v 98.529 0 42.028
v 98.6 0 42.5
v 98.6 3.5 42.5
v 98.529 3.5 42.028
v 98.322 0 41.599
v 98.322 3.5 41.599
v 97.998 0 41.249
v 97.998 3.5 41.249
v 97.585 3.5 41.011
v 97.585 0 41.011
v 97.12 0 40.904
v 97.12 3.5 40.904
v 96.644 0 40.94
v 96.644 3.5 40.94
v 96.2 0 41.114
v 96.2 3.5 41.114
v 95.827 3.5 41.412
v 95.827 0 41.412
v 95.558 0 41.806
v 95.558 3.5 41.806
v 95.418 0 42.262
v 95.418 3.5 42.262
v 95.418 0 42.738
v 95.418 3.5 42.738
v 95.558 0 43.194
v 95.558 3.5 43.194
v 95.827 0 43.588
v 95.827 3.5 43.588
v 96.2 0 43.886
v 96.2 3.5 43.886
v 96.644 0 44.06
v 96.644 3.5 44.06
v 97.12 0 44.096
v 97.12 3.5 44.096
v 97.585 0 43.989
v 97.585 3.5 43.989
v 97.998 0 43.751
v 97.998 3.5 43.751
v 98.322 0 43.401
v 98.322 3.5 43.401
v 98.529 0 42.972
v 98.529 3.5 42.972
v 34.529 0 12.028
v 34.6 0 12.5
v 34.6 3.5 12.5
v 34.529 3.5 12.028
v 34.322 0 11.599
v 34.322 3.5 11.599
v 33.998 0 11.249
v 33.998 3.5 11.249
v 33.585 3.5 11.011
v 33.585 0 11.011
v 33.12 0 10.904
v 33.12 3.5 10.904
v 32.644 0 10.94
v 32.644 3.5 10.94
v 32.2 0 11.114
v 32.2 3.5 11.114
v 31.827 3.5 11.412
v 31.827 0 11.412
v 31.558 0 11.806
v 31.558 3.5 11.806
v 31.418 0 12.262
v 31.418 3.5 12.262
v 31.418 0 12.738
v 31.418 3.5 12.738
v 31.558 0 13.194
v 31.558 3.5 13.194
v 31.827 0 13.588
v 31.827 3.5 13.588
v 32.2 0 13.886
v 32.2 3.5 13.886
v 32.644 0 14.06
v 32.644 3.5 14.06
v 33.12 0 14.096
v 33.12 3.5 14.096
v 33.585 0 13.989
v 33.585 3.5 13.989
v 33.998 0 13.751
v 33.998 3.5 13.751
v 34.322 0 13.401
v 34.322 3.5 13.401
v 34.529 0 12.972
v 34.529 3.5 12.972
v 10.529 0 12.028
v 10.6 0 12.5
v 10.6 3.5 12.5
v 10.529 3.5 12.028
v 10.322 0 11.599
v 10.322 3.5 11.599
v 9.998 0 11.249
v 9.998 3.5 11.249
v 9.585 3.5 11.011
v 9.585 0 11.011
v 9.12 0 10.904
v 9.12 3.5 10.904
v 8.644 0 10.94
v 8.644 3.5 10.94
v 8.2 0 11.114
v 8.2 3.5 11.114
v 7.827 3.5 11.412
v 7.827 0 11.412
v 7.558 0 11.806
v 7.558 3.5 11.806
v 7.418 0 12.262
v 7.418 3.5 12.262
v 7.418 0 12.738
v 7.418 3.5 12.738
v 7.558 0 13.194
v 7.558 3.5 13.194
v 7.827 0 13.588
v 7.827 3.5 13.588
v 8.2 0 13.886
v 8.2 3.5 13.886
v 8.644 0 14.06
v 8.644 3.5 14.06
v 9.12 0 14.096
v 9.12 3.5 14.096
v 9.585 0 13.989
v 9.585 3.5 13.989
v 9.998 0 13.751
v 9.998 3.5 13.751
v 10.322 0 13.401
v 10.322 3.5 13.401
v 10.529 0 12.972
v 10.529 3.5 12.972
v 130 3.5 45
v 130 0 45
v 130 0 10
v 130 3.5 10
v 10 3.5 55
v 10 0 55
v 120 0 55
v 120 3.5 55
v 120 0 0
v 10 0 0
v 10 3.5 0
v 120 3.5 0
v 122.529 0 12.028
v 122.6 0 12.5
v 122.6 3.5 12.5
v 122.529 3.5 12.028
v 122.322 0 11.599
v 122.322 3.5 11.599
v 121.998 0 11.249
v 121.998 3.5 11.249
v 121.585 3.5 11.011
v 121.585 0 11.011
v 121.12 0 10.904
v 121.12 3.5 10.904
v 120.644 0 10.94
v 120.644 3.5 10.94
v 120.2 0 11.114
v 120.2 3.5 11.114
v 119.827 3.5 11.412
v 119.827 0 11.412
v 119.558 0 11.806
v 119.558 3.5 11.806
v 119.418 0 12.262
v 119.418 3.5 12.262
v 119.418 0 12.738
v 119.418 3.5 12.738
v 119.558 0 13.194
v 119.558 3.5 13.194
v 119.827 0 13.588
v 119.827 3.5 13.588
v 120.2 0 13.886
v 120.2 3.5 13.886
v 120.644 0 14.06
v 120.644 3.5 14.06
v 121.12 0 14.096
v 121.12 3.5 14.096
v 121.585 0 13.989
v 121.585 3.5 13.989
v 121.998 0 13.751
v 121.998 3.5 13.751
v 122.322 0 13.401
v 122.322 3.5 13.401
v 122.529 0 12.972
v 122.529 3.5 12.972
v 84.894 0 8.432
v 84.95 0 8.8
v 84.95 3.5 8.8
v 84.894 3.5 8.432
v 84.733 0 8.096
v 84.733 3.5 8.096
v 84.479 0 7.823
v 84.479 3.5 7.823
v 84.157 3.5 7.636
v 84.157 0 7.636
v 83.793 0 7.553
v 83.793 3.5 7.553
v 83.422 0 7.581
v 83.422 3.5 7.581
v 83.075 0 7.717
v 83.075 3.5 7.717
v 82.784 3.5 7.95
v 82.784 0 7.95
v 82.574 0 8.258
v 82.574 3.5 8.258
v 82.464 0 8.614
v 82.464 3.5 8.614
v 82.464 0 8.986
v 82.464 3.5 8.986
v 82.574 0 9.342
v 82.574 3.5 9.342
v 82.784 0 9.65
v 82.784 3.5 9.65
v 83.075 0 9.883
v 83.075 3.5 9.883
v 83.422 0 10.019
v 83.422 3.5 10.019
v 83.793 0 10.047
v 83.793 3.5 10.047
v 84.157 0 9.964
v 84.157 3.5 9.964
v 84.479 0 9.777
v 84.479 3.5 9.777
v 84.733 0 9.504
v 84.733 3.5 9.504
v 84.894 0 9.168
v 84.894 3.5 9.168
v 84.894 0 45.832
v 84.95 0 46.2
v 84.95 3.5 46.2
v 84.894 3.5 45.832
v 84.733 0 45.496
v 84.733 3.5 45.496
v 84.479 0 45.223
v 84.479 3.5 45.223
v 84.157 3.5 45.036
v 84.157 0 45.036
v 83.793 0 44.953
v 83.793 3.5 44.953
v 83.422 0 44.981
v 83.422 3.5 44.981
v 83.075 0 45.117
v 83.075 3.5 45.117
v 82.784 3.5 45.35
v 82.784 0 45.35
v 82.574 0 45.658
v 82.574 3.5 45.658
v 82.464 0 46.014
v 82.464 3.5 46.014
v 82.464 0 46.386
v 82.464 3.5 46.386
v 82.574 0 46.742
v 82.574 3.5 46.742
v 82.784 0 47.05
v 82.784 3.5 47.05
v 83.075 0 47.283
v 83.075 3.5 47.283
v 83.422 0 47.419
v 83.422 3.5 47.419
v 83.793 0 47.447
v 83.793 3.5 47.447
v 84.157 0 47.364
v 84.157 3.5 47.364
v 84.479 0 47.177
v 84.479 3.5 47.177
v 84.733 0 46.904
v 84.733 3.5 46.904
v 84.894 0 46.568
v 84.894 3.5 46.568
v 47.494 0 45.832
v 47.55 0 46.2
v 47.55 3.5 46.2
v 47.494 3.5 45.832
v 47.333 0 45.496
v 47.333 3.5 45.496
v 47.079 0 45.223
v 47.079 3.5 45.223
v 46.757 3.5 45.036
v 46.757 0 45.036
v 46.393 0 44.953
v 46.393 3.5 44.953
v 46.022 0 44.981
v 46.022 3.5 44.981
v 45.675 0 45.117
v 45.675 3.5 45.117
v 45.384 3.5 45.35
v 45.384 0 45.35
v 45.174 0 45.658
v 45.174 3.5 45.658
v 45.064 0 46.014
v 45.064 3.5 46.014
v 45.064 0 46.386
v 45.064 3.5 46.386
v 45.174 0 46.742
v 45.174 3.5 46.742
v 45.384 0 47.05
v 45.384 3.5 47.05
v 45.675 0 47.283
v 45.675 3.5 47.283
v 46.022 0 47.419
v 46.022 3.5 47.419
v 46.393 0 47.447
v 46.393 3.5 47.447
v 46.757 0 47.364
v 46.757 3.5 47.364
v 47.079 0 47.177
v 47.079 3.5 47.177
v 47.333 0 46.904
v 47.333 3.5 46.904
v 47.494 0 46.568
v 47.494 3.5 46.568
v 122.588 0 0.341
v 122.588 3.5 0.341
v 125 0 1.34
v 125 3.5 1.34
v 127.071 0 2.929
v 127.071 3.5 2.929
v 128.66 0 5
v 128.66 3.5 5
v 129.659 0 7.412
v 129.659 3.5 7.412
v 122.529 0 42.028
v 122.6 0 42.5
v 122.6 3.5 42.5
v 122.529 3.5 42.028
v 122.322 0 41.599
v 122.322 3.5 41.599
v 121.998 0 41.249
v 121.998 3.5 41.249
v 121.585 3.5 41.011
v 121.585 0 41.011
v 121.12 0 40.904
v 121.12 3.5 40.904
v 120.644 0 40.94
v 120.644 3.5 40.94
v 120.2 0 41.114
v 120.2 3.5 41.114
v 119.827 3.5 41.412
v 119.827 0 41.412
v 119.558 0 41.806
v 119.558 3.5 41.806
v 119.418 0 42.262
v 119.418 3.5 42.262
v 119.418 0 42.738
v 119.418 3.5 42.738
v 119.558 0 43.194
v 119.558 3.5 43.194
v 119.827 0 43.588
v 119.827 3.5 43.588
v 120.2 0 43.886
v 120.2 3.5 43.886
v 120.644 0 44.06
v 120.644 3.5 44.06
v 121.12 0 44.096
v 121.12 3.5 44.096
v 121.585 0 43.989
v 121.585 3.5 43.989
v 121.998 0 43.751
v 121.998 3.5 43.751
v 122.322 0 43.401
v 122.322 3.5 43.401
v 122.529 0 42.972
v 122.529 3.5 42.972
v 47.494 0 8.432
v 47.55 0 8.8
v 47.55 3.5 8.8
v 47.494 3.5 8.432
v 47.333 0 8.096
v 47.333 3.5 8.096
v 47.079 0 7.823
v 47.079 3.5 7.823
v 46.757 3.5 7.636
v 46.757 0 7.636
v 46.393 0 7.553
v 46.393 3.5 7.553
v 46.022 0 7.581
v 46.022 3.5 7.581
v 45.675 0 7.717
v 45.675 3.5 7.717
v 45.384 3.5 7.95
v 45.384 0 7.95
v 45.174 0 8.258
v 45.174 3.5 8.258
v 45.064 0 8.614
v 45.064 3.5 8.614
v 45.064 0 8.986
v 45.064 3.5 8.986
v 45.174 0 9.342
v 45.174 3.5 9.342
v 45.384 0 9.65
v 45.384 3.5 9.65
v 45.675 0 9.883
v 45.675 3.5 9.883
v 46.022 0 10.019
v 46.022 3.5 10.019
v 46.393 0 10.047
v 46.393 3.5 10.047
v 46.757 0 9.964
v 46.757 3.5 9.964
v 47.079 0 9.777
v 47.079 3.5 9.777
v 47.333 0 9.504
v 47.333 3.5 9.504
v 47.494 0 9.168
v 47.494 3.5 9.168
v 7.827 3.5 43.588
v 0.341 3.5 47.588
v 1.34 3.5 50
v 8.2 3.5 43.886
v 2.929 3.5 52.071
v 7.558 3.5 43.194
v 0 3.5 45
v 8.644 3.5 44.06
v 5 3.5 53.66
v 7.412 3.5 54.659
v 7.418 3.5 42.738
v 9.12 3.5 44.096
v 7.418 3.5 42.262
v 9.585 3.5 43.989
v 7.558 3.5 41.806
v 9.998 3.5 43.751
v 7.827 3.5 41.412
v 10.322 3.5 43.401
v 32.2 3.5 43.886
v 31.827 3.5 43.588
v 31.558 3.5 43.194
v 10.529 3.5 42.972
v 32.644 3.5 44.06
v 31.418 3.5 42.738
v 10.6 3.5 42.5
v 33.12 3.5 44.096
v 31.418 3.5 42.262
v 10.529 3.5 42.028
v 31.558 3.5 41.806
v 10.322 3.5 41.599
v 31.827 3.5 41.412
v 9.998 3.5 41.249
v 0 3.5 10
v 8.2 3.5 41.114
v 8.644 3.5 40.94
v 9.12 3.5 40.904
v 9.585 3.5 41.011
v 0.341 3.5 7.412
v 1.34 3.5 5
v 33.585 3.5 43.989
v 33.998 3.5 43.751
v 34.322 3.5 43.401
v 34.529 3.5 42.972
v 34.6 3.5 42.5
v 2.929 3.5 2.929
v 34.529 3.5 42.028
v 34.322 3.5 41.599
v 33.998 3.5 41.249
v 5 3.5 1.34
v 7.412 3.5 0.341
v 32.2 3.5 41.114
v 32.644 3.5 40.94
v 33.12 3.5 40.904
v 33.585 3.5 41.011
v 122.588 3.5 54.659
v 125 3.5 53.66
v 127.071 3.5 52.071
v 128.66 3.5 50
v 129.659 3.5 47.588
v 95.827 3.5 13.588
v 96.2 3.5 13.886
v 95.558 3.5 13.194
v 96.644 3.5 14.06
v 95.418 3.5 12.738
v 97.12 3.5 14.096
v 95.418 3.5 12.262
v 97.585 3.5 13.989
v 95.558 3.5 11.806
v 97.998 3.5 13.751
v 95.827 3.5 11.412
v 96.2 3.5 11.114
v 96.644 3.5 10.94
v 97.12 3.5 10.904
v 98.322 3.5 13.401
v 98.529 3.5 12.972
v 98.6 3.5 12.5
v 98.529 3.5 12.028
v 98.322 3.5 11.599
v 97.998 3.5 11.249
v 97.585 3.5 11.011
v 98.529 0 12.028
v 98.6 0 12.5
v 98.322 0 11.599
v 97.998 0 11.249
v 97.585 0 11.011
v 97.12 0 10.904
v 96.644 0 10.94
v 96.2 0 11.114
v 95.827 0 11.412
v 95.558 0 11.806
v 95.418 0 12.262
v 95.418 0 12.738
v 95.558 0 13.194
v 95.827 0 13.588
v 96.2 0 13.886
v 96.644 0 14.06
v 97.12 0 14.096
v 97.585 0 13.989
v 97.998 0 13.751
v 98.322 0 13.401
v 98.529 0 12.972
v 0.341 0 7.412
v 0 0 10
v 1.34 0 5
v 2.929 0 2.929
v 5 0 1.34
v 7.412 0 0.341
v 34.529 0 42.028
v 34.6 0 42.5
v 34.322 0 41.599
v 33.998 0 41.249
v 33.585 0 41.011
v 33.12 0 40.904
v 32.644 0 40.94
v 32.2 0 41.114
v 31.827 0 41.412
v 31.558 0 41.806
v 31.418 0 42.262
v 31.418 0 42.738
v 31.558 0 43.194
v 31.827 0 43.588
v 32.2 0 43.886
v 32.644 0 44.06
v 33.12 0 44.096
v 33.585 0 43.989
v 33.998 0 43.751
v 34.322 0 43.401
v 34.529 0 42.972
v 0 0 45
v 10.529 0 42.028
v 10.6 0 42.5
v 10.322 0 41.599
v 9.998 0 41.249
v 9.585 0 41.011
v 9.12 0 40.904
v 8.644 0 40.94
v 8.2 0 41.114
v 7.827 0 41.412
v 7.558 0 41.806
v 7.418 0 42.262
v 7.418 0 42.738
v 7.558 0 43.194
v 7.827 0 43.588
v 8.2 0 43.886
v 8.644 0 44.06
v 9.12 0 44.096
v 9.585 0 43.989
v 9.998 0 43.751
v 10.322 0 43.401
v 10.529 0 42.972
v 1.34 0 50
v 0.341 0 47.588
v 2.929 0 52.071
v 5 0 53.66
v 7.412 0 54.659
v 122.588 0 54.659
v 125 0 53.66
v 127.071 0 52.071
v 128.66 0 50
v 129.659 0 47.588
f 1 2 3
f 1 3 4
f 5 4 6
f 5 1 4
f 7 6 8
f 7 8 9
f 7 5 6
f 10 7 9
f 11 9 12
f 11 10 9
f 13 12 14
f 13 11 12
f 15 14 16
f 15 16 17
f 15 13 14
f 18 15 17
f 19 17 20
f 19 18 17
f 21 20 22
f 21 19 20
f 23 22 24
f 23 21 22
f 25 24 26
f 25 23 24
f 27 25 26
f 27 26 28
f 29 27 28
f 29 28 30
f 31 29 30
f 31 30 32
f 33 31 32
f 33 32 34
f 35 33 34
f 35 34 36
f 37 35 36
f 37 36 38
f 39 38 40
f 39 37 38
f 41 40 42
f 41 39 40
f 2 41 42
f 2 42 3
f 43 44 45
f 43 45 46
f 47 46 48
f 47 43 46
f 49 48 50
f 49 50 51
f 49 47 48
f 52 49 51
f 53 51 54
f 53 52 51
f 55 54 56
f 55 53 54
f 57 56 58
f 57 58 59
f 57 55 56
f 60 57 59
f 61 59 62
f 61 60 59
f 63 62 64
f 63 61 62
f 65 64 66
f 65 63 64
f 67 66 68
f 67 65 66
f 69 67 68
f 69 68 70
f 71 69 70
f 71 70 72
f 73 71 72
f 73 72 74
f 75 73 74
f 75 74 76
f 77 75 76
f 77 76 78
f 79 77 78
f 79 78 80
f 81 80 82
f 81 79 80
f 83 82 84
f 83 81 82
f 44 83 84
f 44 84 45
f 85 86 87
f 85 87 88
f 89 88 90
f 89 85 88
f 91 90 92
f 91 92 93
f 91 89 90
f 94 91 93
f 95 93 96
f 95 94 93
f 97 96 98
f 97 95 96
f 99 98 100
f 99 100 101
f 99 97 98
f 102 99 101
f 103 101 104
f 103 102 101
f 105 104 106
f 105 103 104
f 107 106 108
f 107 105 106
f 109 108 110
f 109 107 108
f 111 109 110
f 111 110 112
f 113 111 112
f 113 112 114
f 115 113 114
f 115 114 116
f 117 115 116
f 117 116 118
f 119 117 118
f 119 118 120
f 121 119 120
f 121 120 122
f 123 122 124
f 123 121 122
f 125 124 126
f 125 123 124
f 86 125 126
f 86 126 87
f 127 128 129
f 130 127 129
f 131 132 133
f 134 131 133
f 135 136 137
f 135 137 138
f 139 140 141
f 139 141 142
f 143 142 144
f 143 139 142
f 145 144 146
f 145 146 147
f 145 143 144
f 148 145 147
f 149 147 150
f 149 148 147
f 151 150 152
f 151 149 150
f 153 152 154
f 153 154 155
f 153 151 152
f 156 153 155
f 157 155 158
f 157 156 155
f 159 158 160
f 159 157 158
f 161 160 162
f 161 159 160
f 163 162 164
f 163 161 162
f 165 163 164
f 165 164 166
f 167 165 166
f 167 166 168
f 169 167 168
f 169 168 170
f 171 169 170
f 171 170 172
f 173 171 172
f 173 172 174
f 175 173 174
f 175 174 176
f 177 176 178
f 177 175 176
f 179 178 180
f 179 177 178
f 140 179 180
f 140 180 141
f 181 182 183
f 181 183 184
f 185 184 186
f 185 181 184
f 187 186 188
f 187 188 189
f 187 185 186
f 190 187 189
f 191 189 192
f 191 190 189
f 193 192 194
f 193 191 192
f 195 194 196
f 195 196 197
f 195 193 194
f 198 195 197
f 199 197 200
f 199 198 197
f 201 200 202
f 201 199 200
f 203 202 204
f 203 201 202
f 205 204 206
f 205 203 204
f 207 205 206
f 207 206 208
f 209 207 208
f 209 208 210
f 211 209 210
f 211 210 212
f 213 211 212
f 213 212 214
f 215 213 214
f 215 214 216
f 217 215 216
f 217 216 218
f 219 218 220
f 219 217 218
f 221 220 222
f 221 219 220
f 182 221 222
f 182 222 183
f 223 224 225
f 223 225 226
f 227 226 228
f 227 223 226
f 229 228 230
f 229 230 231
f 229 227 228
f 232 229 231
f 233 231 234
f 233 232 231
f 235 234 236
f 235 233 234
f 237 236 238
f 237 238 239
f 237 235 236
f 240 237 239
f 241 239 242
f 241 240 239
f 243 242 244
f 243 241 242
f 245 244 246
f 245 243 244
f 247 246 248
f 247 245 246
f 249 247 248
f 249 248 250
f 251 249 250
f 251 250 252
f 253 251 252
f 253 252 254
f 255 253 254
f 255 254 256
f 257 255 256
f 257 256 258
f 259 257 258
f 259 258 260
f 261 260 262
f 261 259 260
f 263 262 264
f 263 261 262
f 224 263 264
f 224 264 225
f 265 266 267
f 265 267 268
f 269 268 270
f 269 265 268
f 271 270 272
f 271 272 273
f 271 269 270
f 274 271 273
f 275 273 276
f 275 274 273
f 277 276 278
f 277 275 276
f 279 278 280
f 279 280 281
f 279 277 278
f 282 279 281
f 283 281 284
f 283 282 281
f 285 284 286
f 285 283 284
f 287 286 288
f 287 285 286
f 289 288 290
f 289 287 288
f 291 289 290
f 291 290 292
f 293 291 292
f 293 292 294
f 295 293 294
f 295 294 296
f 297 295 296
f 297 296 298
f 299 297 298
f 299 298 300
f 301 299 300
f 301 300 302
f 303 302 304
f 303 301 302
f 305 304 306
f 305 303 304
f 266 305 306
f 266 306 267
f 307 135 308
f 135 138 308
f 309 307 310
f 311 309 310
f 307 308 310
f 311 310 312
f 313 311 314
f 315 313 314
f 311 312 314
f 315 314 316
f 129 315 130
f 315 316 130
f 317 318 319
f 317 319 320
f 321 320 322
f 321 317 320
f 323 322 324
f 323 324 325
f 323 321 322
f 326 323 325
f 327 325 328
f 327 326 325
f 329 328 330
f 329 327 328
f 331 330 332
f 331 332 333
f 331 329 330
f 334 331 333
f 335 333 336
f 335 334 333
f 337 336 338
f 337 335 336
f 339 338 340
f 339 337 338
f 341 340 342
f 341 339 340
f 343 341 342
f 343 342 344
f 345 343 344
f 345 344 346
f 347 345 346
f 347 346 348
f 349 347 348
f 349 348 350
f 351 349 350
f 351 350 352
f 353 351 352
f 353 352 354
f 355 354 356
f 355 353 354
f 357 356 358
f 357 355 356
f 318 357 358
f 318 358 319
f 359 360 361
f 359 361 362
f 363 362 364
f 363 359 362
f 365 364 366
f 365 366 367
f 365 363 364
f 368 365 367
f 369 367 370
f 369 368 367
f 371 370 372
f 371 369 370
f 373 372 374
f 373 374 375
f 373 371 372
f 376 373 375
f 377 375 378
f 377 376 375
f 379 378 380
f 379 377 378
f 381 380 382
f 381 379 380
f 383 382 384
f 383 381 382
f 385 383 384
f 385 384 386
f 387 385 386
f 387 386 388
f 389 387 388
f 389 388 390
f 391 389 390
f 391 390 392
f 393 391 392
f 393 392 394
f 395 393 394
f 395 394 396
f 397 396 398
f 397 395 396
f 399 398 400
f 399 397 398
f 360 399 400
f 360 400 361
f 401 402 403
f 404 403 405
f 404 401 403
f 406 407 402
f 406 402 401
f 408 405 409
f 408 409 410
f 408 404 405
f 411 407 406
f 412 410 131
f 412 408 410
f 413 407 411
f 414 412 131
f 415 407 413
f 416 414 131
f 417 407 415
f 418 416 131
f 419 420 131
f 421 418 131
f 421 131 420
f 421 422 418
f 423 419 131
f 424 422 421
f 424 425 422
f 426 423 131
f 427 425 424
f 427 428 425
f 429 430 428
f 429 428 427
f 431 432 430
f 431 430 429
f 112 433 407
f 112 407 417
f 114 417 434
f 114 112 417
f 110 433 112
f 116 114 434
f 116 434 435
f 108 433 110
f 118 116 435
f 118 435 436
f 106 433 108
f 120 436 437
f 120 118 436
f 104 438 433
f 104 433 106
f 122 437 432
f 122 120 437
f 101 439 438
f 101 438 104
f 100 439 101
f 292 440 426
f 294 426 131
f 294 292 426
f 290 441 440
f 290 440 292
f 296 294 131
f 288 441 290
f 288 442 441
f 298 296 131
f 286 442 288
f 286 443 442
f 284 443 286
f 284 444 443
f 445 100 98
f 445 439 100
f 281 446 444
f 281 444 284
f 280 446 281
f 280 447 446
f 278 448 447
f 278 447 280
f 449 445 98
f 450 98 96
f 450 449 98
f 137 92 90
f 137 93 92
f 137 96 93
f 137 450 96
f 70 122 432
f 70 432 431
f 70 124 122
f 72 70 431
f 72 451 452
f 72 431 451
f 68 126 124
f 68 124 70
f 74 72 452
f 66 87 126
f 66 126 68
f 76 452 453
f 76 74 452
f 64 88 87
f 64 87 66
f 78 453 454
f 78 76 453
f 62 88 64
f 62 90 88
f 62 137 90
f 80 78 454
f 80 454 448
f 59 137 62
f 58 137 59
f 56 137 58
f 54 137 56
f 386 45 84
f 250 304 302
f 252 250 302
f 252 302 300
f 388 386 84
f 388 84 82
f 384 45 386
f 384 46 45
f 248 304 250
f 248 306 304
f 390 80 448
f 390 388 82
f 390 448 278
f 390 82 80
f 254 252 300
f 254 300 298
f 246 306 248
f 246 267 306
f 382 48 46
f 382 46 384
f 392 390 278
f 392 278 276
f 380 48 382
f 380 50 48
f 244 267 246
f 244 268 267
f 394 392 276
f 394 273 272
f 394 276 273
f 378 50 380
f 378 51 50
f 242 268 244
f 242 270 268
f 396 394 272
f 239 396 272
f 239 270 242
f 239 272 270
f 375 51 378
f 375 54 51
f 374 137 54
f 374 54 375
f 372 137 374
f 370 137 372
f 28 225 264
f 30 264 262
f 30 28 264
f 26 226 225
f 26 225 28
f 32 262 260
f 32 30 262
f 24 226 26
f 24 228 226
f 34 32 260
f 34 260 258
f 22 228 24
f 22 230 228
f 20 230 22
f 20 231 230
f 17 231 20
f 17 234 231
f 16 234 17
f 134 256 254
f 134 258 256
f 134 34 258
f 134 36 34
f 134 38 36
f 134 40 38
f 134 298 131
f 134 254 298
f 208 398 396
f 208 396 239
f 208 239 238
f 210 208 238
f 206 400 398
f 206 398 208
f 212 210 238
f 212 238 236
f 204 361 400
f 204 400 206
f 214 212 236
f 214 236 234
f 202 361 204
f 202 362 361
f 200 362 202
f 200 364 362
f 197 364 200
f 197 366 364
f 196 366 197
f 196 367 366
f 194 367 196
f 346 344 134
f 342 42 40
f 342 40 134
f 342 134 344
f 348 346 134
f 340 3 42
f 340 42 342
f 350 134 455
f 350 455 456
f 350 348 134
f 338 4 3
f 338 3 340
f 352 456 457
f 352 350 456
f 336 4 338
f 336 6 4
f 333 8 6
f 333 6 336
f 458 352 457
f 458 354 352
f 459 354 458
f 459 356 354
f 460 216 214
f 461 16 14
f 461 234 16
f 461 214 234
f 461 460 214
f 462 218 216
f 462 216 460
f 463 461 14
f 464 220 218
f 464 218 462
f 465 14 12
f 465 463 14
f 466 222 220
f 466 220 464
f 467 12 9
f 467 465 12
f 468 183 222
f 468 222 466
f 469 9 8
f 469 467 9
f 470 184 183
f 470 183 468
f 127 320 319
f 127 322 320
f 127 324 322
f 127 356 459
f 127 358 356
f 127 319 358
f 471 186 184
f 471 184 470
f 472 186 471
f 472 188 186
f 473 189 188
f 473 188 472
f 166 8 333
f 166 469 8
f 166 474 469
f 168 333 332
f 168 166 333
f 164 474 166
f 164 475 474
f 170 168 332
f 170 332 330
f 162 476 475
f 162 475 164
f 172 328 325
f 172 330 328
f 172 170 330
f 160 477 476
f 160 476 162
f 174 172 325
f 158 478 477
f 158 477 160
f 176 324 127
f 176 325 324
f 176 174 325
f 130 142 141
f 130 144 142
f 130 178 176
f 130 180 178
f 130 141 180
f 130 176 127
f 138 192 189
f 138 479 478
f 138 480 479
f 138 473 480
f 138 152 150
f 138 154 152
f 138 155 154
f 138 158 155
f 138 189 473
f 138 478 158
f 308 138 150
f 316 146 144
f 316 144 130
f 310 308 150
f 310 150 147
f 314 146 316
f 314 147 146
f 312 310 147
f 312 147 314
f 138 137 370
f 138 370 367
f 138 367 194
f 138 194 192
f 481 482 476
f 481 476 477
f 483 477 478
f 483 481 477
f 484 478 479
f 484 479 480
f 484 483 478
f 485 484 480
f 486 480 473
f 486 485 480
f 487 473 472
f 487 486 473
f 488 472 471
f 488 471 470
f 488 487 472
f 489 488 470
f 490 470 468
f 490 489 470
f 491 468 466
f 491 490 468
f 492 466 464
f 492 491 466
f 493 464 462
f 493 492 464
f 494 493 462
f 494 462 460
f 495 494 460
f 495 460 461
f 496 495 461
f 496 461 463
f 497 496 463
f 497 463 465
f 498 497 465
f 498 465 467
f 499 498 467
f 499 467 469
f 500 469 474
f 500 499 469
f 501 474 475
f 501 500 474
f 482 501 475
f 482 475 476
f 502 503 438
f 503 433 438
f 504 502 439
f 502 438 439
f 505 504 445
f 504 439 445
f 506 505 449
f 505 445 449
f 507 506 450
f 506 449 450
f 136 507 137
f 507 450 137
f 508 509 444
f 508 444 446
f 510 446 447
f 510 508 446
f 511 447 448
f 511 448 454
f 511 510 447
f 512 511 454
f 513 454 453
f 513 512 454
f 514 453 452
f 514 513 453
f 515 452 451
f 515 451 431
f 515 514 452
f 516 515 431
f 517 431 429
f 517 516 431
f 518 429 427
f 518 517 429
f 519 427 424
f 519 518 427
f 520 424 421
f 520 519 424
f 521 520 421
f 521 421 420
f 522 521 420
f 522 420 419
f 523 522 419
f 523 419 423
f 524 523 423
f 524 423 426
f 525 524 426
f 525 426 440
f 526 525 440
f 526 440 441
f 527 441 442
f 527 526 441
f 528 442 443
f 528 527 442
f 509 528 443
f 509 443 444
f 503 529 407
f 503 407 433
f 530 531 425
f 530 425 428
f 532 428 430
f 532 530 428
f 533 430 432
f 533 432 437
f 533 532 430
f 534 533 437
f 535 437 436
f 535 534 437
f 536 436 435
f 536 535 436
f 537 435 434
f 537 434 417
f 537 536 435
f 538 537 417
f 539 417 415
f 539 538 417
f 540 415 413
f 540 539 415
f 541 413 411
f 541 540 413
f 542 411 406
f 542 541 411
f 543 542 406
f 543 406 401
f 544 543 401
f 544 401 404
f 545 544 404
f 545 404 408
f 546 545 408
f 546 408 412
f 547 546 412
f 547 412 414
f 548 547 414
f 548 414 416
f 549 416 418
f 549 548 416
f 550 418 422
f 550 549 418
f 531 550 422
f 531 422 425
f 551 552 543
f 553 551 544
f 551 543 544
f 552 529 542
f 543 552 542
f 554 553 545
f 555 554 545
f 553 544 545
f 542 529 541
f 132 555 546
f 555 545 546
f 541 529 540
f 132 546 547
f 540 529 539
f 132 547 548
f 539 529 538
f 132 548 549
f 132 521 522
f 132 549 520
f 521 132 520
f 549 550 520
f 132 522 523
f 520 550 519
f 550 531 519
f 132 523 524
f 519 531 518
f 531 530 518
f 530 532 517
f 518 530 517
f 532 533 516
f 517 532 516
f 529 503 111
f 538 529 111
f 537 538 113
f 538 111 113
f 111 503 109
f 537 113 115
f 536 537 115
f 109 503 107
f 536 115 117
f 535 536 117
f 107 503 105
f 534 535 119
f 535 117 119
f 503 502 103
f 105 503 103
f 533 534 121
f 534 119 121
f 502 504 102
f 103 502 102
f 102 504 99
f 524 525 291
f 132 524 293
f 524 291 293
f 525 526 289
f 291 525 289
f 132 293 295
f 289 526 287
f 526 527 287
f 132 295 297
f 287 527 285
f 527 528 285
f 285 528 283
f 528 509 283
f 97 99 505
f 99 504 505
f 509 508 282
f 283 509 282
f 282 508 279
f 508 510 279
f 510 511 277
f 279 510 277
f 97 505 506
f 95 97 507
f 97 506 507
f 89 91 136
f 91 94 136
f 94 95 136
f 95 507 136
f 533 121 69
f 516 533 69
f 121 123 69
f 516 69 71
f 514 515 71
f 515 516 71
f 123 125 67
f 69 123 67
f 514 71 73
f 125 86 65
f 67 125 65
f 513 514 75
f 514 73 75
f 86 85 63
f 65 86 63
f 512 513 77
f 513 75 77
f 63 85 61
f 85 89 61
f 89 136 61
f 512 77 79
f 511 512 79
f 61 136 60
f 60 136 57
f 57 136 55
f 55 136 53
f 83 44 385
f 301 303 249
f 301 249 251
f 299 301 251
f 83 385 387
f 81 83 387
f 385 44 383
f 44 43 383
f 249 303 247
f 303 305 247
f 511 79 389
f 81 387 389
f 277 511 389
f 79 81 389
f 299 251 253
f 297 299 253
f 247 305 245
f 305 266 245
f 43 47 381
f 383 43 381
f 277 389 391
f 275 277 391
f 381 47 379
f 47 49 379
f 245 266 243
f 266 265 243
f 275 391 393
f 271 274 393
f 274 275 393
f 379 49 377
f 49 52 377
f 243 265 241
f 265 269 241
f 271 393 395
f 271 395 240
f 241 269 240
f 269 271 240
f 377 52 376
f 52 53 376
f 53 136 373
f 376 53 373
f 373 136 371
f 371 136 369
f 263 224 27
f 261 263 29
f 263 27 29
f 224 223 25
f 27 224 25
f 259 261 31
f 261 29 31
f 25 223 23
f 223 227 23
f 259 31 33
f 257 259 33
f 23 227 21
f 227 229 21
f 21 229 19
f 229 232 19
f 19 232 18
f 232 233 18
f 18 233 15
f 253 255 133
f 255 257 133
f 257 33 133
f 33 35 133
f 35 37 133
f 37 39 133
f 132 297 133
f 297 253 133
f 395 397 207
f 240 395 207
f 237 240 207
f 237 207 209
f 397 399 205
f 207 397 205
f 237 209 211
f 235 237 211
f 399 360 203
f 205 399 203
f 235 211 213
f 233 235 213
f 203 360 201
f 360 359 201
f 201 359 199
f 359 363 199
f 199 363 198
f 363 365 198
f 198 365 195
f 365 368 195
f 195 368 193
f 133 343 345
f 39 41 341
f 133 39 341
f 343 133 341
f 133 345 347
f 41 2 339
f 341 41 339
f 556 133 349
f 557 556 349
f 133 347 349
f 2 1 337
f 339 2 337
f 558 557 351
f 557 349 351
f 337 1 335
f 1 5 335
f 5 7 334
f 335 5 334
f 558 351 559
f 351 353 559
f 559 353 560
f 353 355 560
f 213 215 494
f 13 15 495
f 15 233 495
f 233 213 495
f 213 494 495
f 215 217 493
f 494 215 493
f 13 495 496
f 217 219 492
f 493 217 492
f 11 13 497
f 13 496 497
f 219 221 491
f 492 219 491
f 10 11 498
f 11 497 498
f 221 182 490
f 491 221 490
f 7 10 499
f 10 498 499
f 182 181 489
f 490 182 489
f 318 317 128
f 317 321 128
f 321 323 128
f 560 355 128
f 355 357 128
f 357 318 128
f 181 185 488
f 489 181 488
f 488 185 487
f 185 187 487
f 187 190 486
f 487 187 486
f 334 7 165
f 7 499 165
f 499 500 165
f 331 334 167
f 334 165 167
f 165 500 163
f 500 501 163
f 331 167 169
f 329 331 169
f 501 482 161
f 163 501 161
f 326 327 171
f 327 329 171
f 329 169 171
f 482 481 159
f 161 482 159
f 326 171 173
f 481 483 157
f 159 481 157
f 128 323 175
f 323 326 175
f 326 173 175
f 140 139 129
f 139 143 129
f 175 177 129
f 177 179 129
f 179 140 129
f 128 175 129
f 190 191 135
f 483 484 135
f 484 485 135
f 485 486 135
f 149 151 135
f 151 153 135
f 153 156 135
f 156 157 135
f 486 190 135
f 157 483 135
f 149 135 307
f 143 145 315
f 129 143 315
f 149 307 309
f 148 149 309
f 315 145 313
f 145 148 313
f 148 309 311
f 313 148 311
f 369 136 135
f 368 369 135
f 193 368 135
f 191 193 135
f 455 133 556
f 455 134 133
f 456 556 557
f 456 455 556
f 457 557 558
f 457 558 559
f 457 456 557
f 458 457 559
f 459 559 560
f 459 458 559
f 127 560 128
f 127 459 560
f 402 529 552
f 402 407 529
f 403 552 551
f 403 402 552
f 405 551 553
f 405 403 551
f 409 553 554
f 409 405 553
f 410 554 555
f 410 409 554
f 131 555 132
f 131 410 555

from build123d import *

# Parameters (mm, degrees)
SKETCH1_W           = 130
SKETCH1_H           = 55
SKETCH1_R           = 1.6
SKETCH1_R_2         = 1.25
BOSS_EXTRUDE1_DEPTH = 3.5
FILLET1_R           = 10


with BuildPart() as part:
    # Sketch1 → Boss-Extrude1 (new body)
    with BuildSketch(Plane(origin=(0, 0, 0), x_dir=(1, 0, 0), z_dir=(0, 1, 0))):
        with Locations((65, -27.5)):
            Rectangle(SKETCH1_W, SKETCH1_H)
        with Locations((9, -12.5)):
            Circle(SKETCH1_R, mode=Mode.SUBTRACT)
        with Locations((9, -42.5)):
            Circle(SKETCH1_R, mode=Mode.SUBTRACT)
        with Locations((33, -12.5)):
            Circle(SKETCH1_R, mode=Mode.SUBTRACT)
        with Locations((33, -42.5)):
            Circle(SKETCH1_R, mode=Mode.SUBTRACT)
        with Locations((121, -42.5)):
            Circle(SKETCH1_R, mode=Mode.SUBTRACT)
        with Locations((97, -42.5)):
            Circle(SKETCH1_R, mode=Mode.SUBTRACT)
        with Locations((97, -12.5)):
            Circle(SKETCH1_R, mode=Mode.SUBTRACT)
        with Locations((121, -12.5)):
            Circle(SKETCH1_R, mode=Mode.SUBTRACT)
        with Locations((83.7, -8.8)):
            Circle(SKETCH1_R_2, mode=Mode.SUBTRACT)
        with Locations((83.7, -46.2)):
            Circle(SKETCH1_R_2, mode=Mode.SUBTRACT)
        with Locations((46.3, -46.2)):
            Circle(SKETCH1_R_2, mode=Mode.SUBTRACT)
        with Locations((46.3, -8.8)):
            Circle(SKETCH1_R_2, mode=Mode.SUBTRACT)
    extrude(amount=BOSS_EXTRUDE1_DEPTH)

    # Fillet1
    fillet1_edges = [part.edges().sort_by_distance(p)[0] for p in [
        (0, 1.75, 0),
        (130, 1.75, 0),
        (130, 1.75, 55),
        (0, 1.75, 55),
    ]]
    fillet(fillet1_edges, radius=FILLET1_R)


solid = part.part
